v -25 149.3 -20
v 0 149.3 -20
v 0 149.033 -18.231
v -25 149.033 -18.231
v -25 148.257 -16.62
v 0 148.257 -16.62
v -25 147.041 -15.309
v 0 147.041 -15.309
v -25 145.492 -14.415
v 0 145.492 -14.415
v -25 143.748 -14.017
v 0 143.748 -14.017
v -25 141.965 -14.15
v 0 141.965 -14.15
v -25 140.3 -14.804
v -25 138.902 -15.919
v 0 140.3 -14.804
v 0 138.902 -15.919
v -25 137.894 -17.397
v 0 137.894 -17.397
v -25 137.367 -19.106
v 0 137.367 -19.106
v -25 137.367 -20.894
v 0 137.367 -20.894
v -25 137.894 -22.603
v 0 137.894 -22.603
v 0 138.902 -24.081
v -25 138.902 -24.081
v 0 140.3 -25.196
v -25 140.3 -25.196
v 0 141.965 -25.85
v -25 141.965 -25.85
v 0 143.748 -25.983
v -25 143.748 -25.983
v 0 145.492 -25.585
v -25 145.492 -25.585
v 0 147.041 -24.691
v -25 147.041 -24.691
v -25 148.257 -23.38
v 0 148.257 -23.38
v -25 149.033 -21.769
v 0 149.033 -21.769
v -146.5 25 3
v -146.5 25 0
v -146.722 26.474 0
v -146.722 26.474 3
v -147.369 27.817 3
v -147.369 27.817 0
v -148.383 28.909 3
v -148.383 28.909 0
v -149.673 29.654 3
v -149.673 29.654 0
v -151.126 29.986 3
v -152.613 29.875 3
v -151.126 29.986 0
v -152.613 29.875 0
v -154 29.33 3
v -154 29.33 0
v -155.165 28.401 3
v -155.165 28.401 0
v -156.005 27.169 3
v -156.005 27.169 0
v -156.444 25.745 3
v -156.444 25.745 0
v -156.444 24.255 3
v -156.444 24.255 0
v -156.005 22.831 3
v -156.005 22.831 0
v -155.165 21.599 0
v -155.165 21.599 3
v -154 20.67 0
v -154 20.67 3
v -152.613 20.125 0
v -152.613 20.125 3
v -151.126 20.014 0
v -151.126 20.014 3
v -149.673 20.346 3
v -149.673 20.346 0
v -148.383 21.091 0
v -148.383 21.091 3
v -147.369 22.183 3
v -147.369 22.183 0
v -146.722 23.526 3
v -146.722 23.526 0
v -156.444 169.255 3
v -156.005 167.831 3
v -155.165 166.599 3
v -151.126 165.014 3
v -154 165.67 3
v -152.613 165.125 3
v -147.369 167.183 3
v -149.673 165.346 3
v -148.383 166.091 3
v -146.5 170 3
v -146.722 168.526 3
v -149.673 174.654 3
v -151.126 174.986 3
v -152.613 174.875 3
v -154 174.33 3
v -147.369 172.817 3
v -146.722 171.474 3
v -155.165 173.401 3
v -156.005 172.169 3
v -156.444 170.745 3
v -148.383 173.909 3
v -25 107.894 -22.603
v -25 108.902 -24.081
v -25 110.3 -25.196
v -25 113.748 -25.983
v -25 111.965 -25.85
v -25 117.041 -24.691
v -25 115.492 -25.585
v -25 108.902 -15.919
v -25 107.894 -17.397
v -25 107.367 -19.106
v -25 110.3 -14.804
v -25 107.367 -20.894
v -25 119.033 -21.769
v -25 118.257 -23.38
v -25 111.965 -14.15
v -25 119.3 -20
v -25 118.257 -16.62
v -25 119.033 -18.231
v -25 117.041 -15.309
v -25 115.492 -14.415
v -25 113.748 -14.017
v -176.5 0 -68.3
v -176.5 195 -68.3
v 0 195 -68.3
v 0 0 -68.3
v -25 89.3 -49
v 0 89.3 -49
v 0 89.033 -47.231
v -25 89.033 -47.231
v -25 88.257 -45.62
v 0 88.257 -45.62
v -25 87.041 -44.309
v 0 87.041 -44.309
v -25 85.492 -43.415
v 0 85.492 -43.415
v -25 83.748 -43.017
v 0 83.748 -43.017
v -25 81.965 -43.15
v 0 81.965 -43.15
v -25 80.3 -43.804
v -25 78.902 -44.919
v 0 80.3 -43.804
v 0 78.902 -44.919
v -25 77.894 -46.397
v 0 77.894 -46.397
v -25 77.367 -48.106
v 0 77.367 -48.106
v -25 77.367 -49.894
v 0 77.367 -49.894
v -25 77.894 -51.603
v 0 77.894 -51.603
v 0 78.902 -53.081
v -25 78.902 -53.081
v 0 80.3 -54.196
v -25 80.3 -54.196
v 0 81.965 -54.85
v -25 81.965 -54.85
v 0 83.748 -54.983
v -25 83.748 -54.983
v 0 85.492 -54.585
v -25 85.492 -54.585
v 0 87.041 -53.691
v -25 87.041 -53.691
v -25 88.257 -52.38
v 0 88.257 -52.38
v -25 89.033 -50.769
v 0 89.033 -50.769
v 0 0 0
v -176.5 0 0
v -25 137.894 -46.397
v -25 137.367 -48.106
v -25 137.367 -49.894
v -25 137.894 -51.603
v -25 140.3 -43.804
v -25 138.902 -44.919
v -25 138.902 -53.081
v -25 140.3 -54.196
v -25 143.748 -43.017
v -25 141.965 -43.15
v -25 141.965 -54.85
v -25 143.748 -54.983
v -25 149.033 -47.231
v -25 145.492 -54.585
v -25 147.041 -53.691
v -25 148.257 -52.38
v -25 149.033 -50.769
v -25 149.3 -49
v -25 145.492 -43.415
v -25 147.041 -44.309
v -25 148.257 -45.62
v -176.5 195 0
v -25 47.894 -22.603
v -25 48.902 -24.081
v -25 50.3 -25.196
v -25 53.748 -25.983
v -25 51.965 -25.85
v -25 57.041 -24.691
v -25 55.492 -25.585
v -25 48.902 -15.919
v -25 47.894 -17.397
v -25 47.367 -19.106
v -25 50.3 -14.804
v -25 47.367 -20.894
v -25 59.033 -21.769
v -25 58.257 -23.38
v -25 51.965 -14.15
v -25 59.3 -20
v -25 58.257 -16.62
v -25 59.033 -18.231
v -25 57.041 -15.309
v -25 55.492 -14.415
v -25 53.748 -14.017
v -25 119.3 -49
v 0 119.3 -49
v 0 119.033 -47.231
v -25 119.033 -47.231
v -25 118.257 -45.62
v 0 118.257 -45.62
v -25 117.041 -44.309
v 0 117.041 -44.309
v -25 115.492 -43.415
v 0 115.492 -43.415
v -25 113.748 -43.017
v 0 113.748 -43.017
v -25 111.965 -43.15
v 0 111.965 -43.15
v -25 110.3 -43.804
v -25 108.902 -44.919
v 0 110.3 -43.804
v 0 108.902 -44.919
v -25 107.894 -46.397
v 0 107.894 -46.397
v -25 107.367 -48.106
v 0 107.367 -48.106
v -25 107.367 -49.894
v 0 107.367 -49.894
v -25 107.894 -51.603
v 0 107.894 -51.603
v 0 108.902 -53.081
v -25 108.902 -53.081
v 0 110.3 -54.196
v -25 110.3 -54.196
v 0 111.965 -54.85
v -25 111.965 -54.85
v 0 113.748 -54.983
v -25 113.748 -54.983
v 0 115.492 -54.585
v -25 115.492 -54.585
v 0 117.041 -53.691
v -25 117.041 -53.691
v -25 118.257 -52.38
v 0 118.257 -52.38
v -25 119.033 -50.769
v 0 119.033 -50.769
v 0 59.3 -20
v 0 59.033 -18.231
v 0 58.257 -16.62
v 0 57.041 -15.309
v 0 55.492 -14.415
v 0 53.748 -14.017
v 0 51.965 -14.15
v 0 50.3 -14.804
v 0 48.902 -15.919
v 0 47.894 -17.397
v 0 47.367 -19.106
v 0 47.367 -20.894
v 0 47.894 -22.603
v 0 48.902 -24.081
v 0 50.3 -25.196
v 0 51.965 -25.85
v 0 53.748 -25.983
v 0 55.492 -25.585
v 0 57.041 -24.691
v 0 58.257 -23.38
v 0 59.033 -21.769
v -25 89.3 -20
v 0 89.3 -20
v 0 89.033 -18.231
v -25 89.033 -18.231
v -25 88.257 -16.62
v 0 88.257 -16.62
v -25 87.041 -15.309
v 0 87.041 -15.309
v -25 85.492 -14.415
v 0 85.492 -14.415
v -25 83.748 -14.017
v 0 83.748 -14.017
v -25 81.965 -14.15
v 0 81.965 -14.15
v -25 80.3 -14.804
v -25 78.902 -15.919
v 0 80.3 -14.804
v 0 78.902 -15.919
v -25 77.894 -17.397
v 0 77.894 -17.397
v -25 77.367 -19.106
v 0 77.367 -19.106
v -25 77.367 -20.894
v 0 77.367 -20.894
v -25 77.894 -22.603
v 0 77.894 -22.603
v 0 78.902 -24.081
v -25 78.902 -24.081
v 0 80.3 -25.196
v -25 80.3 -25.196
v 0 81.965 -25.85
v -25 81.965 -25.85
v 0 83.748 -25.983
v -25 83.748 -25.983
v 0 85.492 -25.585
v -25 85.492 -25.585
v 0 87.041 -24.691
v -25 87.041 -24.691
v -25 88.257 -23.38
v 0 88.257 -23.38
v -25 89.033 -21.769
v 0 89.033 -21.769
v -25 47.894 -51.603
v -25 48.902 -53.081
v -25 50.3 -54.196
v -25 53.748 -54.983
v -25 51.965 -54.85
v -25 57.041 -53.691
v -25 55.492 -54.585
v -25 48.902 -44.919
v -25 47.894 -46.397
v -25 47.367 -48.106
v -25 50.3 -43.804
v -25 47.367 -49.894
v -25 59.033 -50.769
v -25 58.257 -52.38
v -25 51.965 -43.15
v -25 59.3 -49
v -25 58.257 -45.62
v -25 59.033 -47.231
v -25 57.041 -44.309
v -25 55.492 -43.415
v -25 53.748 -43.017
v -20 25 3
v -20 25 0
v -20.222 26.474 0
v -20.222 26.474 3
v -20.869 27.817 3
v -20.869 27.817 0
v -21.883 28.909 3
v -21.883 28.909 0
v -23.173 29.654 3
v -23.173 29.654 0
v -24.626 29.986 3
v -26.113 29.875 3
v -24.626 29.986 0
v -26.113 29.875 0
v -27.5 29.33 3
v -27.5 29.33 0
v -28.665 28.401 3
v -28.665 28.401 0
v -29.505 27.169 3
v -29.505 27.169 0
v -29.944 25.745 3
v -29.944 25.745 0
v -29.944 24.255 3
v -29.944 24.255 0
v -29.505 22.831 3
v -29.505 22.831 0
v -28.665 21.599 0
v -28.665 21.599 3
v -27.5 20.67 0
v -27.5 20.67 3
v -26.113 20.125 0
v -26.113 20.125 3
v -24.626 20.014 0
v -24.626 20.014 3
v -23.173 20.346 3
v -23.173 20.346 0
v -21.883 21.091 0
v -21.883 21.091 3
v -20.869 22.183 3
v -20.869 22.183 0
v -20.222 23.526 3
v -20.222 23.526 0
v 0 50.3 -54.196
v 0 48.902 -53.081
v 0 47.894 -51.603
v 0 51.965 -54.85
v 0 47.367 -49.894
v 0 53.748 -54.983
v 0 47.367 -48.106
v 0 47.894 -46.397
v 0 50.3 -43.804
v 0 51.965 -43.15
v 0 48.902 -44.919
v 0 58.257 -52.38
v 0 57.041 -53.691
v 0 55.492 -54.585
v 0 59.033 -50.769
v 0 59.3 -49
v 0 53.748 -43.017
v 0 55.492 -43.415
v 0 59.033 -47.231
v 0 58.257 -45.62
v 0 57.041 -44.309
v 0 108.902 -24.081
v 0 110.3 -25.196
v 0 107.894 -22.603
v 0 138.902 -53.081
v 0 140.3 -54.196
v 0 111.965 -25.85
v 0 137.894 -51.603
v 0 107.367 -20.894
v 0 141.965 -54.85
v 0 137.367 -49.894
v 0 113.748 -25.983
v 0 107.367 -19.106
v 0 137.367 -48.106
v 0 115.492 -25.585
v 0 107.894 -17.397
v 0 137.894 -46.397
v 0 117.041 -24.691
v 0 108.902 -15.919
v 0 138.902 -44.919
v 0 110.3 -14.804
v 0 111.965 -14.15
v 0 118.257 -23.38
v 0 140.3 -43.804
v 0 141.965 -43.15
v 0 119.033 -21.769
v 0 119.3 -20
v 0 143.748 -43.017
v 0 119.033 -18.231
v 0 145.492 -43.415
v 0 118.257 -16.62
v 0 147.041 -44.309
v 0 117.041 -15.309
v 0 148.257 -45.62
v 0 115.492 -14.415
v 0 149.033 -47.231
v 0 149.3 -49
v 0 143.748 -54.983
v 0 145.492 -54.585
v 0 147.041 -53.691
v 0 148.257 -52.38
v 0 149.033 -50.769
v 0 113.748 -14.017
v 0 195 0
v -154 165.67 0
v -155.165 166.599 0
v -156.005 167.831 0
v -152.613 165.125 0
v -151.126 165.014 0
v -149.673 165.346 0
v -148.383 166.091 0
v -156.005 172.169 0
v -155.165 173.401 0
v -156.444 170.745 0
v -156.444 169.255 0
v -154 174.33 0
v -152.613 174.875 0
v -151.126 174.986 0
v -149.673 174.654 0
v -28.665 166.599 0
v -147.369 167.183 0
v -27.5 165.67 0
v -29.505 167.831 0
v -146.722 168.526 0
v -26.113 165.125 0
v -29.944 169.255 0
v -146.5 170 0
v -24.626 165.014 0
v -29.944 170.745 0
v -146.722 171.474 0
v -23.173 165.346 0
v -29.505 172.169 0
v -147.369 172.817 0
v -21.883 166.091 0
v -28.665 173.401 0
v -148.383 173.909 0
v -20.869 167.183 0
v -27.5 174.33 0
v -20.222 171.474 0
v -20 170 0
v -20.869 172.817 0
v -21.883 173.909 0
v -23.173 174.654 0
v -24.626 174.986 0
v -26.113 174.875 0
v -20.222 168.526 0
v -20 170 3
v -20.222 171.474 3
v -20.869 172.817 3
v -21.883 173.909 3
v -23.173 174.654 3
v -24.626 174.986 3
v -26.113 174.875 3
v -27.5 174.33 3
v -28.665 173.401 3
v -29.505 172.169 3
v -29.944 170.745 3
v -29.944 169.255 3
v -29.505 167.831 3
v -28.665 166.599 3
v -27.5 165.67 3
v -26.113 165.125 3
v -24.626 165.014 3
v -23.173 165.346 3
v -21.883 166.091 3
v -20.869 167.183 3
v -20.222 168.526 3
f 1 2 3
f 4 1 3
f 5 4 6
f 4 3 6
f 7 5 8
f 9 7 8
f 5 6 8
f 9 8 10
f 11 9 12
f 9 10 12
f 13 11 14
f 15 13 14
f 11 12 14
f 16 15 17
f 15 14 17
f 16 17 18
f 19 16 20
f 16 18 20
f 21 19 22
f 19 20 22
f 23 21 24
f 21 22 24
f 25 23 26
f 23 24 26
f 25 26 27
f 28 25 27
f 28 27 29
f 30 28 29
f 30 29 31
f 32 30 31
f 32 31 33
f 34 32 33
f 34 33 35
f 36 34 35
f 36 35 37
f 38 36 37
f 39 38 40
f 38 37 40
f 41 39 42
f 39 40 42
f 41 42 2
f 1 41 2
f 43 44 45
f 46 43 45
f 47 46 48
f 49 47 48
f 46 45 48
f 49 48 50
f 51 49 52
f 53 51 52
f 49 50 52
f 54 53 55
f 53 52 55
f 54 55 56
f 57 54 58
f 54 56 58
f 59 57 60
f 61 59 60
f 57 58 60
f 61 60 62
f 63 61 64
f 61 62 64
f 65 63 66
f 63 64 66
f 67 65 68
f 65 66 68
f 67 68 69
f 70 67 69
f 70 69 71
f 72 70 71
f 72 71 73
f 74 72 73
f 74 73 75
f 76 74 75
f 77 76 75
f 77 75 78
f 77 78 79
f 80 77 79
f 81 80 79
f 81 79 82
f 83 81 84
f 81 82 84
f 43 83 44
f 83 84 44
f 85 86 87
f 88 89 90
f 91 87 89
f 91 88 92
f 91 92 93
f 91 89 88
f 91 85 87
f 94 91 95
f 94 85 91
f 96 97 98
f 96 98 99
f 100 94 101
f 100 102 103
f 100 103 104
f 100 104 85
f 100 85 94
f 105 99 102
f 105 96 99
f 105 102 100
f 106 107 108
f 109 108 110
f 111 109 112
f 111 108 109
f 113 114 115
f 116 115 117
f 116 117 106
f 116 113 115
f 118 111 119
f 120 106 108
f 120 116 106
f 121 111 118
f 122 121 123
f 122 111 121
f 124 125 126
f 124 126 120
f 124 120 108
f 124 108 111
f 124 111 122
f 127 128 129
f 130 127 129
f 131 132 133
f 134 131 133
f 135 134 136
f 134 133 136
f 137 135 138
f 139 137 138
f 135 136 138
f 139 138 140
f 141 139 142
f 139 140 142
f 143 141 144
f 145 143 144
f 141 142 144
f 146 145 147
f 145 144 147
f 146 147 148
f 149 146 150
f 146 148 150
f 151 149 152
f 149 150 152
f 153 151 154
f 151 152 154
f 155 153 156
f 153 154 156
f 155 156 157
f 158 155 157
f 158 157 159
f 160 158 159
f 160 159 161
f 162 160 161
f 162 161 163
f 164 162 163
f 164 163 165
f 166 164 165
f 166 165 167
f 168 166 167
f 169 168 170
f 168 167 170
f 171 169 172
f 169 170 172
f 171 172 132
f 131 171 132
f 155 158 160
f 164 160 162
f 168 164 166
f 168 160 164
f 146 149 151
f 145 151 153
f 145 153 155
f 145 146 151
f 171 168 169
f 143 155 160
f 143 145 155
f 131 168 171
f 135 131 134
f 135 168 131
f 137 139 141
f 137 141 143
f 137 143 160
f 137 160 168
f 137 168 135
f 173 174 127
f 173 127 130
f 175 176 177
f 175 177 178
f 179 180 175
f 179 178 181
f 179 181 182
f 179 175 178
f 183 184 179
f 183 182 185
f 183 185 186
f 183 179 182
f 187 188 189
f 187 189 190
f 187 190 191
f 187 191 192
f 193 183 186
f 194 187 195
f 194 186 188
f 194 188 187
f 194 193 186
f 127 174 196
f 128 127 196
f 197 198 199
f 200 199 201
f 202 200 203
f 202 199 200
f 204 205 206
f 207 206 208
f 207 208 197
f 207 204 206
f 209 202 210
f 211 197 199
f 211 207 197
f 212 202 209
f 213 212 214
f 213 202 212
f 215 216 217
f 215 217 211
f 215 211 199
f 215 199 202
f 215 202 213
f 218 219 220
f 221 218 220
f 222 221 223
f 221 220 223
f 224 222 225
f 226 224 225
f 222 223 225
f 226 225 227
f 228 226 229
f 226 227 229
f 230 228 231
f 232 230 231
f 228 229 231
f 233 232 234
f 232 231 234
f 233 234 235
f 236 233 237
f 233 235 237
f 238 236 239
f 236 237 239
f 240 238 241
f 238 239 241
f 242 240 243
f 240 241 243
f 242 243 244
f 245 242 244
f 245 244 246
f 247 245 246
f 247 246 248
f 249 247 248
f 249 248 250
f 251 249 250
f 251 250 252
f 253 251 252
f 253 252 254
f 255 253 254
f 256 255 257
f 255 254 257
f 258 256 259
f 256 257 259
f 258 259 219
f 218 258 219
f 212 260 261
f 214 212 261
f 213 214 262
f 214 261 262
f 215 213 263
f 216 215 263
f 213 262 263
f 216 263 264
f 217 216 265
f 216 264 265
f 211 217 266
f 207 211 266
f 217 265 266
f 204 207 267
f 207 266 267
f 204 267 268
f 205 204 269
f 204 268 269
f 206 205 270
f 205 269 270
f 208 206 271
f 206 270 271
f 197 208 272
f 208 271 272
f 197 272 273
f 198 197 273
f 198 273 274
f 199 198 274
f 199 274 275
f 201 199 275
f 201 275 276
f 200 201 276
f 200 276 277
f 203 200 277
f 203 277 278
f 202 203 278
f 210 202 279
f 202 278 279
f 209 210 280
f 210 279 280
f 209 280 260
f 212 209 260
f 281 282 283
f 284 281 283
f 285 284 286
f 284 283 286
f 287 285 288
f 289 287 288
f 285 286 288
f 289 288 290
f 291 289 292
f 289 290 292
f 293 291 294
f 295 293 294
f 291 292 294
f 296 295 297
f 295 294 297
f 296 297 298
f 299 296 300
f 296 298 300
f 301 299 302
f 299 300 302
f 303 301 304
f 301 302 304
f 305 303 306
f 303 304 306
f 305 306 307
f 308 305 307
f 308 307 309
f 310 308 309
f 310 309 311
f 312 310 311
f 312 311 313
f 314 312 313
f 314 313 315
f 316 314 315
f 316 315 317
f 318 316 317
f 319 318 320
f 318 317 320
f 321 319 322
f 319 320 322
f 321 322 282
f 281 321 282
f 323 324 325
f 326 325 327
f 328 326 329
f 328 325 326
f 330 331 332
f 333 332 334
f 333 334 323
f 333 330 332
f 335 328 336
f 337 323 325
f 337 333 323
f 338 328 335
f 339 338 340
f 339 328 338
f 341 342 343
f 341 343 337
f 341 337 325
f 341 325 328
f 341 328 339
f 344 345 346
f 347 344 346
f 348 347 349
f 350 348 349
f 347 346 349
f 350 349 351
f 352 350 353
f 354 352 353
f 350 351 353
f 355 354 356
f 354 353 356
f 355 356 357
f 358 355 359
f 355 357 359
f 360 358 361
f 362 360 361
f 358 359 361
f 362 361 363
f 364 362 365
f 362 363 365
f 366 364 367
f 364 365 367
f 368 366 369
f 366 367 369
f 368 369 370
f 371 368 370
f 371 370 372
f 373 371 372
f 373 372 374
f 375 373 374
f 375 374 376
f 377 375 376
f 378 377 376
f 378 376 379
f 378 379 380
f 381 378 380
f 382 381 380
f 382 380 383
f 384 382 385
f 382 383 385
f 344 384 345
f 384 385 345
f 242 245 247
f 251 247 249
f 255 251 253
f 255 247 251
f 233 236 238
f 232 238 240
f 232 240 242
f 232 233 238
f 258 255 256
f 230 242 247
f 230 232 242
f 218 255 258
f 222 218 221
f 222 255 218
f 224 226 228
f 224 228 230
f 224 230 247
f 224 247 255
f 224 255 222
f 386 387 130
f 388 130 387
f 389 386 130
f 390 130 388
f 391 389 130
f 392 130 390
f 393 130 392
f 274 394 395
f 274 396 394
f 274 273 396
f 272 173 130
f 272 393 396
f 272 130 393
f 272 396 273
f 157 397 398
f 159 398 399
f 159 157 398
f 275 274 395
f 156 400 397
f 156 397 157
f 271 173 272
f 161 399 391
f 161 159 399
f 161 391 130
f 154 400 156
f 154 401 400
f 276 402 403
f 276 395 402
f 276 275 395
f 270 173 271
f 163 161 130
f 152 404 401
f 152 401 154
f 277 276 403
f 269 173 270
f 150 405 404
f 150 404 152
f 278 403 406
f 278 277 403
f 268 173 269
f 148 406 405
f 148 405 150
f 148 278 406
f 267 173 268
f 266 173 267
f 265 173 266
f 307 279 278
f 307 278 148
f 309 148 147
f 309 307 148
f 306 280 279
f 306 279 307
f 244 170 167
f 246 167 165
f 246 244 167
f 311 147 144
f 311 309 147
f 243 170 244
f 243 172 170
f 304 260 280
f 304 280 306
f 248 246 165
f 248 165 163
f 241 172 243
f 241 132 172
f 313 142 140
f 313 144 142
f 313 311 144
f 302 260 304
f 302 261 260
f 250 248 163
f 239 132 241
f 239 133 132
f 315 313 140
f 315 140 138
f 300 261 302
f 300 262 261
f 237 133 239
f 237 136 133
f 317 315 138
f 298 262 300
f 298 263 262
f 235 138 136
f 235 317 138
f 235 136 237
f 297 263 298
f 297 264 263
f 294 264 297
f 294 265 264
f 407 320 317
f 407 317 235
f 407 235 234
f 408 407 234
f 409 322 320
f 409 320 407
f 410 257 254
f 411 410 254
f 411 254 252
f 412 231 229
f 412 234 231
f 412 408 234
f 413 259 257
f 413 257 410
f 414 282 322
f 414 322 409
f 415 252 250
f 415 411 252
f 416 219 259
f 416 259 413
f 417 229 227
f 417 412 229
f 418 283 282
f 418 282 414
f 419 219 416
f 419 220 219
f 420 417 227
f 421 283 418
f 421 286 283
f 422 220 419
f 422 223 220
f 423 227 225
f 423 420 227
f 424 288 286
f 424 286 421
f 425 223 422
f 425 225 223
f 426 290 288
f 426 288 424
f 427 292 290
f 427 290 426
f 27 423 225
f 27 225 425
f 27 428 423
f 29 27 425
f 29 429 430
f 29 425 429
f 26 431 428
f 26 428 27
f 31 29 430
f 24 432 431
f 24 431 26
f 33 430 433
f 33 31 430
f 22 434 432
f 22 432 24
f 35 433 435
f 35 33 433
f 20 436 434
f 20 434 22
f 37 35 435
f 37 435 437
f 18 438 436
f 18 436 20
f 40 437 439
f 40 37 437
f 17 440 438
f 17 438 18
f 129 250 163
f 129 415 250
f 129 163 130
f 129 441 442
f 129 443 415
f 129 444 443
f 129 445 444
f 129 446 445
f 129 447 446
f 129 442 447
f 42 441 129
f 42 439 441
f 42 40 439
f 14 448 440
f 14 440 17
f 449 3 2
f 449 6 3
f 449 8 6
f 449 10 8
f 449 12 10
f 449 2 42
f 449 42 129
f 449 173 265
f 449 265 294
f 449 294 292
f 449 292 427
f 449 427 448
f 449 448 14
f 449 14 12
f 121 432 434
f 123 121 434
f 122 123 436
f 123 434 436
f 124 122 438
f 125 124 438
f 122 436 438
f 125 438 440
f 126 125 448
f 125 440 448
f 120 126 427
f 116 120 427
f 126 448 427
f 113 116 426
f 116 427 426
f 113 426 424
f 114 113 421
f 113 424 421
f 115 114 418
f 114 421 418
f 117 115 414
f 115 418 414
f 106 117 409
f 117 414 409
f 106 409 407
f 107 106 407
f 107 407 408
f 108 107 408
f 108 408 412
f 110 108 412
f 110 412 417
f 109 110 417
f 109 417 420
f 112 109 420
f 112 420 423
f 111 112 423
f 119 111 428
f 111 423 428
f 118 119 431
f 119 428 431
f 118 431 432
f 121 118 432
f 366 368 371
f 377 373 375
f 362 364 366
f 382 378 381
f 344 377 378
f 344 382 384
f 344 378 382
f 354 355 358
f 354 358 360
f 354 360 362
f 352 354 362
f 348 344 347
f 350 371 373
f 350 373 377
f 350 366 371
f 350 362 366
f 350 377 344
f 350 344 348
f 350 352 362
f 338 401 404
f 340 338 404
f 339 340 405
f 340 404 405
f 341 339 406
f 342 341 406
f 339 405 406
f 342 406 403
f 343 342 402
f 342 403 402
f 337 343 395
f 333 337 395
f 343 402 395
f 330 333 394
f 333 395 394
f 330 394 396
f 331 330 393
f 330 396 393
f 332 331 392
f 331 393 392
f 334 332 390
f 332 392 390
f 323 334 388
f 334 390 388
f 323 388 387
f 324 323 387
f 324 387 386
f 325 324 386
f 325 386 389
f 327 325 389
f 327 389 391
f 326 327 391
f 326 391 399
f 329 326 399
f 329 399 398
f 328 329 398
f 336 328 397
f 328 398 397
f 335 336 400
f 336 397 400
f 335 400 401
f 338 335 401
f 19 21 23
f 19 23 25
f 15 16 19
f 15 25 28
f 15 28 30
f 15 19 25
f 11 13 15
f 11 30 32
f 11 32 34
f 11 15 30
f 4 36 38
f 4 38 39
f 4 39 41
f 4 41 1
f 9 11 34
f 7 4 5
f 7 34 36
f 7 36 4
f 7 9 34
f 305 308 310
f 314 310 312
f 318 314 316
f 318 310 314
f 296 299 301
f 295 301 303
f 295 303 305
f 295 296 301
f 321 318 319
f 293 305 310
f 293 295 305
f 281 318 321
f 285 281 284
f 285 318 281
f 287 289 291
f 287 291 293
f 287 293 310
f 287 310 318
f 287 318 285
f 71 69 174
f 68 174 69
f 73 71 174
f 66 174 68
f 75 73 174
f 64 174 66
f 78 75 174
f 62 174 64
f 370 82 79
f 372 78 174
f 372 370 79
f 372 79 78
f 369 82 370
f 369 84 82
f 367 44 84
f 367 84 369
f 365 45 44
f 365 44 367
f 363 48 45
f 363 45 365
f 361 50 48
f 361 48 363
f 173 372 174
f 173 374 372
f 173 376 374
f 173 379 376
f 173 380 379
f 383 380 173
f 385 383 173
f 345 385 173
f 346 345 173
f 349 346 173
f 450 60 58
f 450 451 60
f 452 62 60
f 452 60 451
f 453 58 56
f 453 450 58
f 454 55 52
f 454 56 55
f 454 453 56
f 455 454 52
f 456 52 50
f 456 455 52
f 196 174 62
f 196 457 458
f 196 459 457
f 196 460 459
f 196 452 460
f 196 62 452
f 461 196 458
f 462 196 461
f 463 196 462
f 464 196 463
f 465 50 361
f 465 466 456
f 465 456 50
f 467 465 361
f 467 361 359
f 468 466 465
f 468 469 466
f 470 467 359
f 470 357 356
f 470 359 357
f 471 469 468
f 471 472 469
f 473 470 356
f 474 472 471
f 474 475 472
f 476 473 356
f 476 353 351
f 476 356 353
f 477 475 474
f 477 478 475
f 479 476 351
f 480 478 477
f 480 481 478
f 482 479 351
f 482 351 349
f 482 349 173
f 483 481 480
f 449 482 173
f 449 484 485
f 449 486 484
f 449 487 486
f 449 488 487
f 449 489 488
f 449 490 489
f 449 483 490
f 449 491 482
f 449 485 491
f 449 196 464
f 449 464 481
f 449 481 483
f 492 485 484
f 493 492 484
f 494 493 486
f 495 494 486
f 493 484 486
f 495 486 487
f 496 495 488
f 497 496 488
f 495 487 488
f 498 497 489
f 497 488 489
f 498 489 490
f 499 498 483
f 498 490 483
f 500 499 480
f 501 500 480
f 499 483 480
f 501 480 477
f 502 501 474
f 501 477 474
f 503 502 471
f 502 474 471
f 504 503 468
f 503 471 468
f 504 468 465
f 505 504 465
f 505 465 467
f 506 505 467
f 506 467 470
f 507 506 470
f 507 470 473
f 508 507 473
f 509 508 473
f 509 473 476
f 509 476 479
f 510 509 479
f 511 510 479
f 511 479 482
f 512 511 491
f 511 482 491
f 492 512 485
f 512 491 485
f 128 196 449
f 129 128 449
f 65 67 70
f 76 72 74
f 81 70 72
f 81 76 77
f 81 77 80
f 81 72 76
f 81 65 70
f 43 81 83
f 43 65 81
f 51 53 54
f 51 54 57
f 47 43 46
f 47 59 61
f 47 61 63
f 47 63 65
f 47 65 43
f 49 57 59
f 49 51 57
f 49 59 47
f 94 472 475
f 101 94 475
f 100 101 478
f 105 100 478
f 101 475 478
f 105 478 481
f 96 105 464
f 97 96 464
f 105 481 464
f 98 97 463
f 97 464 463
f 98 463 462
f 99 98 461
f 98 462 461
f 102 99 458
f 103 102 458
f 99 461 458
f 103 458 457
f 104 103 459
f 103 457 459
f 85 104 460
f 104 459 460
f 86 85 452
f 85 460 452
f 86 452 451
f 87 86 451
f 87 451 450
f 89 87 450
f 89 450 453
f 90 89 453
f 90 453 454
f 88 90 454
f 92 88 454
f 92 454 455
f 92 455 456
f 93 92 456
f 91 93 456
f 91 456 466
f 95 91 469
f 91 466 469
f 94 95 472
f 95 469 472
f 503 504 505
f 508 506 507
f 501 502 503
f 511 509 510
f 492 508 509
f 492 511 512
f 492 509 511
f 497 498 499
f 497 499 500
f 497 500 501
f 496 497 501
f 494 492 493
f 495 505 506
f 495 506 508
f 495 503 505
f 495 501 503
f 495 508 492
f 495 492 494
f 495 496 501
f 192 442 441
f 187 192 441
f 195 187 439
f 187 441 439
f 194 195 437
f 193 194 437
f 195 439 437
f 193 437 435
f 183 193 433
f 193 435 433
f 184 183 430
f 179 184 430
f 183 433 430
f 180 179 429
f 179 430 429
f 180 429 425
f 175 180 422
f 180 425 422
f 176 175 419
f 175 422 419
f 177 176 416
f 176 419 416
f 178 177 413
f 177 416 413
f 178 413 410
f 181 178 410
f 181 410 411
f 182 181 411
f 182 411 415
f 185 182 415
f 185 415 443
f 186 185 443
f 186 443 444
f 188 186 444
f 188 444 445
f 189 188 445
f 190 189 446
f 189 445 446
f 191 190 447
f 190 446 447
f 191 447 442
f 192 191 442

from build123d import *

# Parameters (mm, degrees)
F0_W     = 176.5
F0_H     = 195
F1_DEPTH = 68.3
F2_R     = 5
F3_DEPTH = 3
F4_R     = 6
F5_DEPTH = 25


with BuildPart() as f1:
    # F0 (on Top) → F1 (new body)
    with BuildSketch(Plane.XY):
        with Locations((-88.25, 97.5)):
            Rectangle(F0_W, F0_H)
    extrude(amount=-F1_DEPTH)

    # F2 (on face) → F3 (join)
    with BuildSketch(Plane.XY):
        with Locations((-25, 170)):
            Circle(F2_R)
        with Locations((-151.5, 170)):
            Circle(F2_R)
        with Locations((-151.5, 25)):
            Circle(F2_R)
        with Locations((-25, 25)):
            Circle(F2_R)
    extrude(amount=F3_DEPTH)

    # F4 (on face) → F5 (cut)
    with BuildSketch(Plane.YZ):
        with Locations((143.3, -49)):
            Circle(F4_R)
        with Locations((113.3, -49)):
            Circle(F4_R)
        with Locations((83.3, -49)):
            Circle(F4_R)
        with Locations((53.3, -49)):
            Circle(F4_R)
        with Locations((53.3, -20)):
            Circle(F4_R)
        with Locations((83.3, -20)):
            Circle(F4_R)
        with Locations((113.3, -20)):
            Circle(F4_R)
        with Locations((143.3, -20)):
            Circle(F4_R)
    extrude(amount=-F5_DEPTH, mode=Mode.SUBTRACT)


solid = f1.part
